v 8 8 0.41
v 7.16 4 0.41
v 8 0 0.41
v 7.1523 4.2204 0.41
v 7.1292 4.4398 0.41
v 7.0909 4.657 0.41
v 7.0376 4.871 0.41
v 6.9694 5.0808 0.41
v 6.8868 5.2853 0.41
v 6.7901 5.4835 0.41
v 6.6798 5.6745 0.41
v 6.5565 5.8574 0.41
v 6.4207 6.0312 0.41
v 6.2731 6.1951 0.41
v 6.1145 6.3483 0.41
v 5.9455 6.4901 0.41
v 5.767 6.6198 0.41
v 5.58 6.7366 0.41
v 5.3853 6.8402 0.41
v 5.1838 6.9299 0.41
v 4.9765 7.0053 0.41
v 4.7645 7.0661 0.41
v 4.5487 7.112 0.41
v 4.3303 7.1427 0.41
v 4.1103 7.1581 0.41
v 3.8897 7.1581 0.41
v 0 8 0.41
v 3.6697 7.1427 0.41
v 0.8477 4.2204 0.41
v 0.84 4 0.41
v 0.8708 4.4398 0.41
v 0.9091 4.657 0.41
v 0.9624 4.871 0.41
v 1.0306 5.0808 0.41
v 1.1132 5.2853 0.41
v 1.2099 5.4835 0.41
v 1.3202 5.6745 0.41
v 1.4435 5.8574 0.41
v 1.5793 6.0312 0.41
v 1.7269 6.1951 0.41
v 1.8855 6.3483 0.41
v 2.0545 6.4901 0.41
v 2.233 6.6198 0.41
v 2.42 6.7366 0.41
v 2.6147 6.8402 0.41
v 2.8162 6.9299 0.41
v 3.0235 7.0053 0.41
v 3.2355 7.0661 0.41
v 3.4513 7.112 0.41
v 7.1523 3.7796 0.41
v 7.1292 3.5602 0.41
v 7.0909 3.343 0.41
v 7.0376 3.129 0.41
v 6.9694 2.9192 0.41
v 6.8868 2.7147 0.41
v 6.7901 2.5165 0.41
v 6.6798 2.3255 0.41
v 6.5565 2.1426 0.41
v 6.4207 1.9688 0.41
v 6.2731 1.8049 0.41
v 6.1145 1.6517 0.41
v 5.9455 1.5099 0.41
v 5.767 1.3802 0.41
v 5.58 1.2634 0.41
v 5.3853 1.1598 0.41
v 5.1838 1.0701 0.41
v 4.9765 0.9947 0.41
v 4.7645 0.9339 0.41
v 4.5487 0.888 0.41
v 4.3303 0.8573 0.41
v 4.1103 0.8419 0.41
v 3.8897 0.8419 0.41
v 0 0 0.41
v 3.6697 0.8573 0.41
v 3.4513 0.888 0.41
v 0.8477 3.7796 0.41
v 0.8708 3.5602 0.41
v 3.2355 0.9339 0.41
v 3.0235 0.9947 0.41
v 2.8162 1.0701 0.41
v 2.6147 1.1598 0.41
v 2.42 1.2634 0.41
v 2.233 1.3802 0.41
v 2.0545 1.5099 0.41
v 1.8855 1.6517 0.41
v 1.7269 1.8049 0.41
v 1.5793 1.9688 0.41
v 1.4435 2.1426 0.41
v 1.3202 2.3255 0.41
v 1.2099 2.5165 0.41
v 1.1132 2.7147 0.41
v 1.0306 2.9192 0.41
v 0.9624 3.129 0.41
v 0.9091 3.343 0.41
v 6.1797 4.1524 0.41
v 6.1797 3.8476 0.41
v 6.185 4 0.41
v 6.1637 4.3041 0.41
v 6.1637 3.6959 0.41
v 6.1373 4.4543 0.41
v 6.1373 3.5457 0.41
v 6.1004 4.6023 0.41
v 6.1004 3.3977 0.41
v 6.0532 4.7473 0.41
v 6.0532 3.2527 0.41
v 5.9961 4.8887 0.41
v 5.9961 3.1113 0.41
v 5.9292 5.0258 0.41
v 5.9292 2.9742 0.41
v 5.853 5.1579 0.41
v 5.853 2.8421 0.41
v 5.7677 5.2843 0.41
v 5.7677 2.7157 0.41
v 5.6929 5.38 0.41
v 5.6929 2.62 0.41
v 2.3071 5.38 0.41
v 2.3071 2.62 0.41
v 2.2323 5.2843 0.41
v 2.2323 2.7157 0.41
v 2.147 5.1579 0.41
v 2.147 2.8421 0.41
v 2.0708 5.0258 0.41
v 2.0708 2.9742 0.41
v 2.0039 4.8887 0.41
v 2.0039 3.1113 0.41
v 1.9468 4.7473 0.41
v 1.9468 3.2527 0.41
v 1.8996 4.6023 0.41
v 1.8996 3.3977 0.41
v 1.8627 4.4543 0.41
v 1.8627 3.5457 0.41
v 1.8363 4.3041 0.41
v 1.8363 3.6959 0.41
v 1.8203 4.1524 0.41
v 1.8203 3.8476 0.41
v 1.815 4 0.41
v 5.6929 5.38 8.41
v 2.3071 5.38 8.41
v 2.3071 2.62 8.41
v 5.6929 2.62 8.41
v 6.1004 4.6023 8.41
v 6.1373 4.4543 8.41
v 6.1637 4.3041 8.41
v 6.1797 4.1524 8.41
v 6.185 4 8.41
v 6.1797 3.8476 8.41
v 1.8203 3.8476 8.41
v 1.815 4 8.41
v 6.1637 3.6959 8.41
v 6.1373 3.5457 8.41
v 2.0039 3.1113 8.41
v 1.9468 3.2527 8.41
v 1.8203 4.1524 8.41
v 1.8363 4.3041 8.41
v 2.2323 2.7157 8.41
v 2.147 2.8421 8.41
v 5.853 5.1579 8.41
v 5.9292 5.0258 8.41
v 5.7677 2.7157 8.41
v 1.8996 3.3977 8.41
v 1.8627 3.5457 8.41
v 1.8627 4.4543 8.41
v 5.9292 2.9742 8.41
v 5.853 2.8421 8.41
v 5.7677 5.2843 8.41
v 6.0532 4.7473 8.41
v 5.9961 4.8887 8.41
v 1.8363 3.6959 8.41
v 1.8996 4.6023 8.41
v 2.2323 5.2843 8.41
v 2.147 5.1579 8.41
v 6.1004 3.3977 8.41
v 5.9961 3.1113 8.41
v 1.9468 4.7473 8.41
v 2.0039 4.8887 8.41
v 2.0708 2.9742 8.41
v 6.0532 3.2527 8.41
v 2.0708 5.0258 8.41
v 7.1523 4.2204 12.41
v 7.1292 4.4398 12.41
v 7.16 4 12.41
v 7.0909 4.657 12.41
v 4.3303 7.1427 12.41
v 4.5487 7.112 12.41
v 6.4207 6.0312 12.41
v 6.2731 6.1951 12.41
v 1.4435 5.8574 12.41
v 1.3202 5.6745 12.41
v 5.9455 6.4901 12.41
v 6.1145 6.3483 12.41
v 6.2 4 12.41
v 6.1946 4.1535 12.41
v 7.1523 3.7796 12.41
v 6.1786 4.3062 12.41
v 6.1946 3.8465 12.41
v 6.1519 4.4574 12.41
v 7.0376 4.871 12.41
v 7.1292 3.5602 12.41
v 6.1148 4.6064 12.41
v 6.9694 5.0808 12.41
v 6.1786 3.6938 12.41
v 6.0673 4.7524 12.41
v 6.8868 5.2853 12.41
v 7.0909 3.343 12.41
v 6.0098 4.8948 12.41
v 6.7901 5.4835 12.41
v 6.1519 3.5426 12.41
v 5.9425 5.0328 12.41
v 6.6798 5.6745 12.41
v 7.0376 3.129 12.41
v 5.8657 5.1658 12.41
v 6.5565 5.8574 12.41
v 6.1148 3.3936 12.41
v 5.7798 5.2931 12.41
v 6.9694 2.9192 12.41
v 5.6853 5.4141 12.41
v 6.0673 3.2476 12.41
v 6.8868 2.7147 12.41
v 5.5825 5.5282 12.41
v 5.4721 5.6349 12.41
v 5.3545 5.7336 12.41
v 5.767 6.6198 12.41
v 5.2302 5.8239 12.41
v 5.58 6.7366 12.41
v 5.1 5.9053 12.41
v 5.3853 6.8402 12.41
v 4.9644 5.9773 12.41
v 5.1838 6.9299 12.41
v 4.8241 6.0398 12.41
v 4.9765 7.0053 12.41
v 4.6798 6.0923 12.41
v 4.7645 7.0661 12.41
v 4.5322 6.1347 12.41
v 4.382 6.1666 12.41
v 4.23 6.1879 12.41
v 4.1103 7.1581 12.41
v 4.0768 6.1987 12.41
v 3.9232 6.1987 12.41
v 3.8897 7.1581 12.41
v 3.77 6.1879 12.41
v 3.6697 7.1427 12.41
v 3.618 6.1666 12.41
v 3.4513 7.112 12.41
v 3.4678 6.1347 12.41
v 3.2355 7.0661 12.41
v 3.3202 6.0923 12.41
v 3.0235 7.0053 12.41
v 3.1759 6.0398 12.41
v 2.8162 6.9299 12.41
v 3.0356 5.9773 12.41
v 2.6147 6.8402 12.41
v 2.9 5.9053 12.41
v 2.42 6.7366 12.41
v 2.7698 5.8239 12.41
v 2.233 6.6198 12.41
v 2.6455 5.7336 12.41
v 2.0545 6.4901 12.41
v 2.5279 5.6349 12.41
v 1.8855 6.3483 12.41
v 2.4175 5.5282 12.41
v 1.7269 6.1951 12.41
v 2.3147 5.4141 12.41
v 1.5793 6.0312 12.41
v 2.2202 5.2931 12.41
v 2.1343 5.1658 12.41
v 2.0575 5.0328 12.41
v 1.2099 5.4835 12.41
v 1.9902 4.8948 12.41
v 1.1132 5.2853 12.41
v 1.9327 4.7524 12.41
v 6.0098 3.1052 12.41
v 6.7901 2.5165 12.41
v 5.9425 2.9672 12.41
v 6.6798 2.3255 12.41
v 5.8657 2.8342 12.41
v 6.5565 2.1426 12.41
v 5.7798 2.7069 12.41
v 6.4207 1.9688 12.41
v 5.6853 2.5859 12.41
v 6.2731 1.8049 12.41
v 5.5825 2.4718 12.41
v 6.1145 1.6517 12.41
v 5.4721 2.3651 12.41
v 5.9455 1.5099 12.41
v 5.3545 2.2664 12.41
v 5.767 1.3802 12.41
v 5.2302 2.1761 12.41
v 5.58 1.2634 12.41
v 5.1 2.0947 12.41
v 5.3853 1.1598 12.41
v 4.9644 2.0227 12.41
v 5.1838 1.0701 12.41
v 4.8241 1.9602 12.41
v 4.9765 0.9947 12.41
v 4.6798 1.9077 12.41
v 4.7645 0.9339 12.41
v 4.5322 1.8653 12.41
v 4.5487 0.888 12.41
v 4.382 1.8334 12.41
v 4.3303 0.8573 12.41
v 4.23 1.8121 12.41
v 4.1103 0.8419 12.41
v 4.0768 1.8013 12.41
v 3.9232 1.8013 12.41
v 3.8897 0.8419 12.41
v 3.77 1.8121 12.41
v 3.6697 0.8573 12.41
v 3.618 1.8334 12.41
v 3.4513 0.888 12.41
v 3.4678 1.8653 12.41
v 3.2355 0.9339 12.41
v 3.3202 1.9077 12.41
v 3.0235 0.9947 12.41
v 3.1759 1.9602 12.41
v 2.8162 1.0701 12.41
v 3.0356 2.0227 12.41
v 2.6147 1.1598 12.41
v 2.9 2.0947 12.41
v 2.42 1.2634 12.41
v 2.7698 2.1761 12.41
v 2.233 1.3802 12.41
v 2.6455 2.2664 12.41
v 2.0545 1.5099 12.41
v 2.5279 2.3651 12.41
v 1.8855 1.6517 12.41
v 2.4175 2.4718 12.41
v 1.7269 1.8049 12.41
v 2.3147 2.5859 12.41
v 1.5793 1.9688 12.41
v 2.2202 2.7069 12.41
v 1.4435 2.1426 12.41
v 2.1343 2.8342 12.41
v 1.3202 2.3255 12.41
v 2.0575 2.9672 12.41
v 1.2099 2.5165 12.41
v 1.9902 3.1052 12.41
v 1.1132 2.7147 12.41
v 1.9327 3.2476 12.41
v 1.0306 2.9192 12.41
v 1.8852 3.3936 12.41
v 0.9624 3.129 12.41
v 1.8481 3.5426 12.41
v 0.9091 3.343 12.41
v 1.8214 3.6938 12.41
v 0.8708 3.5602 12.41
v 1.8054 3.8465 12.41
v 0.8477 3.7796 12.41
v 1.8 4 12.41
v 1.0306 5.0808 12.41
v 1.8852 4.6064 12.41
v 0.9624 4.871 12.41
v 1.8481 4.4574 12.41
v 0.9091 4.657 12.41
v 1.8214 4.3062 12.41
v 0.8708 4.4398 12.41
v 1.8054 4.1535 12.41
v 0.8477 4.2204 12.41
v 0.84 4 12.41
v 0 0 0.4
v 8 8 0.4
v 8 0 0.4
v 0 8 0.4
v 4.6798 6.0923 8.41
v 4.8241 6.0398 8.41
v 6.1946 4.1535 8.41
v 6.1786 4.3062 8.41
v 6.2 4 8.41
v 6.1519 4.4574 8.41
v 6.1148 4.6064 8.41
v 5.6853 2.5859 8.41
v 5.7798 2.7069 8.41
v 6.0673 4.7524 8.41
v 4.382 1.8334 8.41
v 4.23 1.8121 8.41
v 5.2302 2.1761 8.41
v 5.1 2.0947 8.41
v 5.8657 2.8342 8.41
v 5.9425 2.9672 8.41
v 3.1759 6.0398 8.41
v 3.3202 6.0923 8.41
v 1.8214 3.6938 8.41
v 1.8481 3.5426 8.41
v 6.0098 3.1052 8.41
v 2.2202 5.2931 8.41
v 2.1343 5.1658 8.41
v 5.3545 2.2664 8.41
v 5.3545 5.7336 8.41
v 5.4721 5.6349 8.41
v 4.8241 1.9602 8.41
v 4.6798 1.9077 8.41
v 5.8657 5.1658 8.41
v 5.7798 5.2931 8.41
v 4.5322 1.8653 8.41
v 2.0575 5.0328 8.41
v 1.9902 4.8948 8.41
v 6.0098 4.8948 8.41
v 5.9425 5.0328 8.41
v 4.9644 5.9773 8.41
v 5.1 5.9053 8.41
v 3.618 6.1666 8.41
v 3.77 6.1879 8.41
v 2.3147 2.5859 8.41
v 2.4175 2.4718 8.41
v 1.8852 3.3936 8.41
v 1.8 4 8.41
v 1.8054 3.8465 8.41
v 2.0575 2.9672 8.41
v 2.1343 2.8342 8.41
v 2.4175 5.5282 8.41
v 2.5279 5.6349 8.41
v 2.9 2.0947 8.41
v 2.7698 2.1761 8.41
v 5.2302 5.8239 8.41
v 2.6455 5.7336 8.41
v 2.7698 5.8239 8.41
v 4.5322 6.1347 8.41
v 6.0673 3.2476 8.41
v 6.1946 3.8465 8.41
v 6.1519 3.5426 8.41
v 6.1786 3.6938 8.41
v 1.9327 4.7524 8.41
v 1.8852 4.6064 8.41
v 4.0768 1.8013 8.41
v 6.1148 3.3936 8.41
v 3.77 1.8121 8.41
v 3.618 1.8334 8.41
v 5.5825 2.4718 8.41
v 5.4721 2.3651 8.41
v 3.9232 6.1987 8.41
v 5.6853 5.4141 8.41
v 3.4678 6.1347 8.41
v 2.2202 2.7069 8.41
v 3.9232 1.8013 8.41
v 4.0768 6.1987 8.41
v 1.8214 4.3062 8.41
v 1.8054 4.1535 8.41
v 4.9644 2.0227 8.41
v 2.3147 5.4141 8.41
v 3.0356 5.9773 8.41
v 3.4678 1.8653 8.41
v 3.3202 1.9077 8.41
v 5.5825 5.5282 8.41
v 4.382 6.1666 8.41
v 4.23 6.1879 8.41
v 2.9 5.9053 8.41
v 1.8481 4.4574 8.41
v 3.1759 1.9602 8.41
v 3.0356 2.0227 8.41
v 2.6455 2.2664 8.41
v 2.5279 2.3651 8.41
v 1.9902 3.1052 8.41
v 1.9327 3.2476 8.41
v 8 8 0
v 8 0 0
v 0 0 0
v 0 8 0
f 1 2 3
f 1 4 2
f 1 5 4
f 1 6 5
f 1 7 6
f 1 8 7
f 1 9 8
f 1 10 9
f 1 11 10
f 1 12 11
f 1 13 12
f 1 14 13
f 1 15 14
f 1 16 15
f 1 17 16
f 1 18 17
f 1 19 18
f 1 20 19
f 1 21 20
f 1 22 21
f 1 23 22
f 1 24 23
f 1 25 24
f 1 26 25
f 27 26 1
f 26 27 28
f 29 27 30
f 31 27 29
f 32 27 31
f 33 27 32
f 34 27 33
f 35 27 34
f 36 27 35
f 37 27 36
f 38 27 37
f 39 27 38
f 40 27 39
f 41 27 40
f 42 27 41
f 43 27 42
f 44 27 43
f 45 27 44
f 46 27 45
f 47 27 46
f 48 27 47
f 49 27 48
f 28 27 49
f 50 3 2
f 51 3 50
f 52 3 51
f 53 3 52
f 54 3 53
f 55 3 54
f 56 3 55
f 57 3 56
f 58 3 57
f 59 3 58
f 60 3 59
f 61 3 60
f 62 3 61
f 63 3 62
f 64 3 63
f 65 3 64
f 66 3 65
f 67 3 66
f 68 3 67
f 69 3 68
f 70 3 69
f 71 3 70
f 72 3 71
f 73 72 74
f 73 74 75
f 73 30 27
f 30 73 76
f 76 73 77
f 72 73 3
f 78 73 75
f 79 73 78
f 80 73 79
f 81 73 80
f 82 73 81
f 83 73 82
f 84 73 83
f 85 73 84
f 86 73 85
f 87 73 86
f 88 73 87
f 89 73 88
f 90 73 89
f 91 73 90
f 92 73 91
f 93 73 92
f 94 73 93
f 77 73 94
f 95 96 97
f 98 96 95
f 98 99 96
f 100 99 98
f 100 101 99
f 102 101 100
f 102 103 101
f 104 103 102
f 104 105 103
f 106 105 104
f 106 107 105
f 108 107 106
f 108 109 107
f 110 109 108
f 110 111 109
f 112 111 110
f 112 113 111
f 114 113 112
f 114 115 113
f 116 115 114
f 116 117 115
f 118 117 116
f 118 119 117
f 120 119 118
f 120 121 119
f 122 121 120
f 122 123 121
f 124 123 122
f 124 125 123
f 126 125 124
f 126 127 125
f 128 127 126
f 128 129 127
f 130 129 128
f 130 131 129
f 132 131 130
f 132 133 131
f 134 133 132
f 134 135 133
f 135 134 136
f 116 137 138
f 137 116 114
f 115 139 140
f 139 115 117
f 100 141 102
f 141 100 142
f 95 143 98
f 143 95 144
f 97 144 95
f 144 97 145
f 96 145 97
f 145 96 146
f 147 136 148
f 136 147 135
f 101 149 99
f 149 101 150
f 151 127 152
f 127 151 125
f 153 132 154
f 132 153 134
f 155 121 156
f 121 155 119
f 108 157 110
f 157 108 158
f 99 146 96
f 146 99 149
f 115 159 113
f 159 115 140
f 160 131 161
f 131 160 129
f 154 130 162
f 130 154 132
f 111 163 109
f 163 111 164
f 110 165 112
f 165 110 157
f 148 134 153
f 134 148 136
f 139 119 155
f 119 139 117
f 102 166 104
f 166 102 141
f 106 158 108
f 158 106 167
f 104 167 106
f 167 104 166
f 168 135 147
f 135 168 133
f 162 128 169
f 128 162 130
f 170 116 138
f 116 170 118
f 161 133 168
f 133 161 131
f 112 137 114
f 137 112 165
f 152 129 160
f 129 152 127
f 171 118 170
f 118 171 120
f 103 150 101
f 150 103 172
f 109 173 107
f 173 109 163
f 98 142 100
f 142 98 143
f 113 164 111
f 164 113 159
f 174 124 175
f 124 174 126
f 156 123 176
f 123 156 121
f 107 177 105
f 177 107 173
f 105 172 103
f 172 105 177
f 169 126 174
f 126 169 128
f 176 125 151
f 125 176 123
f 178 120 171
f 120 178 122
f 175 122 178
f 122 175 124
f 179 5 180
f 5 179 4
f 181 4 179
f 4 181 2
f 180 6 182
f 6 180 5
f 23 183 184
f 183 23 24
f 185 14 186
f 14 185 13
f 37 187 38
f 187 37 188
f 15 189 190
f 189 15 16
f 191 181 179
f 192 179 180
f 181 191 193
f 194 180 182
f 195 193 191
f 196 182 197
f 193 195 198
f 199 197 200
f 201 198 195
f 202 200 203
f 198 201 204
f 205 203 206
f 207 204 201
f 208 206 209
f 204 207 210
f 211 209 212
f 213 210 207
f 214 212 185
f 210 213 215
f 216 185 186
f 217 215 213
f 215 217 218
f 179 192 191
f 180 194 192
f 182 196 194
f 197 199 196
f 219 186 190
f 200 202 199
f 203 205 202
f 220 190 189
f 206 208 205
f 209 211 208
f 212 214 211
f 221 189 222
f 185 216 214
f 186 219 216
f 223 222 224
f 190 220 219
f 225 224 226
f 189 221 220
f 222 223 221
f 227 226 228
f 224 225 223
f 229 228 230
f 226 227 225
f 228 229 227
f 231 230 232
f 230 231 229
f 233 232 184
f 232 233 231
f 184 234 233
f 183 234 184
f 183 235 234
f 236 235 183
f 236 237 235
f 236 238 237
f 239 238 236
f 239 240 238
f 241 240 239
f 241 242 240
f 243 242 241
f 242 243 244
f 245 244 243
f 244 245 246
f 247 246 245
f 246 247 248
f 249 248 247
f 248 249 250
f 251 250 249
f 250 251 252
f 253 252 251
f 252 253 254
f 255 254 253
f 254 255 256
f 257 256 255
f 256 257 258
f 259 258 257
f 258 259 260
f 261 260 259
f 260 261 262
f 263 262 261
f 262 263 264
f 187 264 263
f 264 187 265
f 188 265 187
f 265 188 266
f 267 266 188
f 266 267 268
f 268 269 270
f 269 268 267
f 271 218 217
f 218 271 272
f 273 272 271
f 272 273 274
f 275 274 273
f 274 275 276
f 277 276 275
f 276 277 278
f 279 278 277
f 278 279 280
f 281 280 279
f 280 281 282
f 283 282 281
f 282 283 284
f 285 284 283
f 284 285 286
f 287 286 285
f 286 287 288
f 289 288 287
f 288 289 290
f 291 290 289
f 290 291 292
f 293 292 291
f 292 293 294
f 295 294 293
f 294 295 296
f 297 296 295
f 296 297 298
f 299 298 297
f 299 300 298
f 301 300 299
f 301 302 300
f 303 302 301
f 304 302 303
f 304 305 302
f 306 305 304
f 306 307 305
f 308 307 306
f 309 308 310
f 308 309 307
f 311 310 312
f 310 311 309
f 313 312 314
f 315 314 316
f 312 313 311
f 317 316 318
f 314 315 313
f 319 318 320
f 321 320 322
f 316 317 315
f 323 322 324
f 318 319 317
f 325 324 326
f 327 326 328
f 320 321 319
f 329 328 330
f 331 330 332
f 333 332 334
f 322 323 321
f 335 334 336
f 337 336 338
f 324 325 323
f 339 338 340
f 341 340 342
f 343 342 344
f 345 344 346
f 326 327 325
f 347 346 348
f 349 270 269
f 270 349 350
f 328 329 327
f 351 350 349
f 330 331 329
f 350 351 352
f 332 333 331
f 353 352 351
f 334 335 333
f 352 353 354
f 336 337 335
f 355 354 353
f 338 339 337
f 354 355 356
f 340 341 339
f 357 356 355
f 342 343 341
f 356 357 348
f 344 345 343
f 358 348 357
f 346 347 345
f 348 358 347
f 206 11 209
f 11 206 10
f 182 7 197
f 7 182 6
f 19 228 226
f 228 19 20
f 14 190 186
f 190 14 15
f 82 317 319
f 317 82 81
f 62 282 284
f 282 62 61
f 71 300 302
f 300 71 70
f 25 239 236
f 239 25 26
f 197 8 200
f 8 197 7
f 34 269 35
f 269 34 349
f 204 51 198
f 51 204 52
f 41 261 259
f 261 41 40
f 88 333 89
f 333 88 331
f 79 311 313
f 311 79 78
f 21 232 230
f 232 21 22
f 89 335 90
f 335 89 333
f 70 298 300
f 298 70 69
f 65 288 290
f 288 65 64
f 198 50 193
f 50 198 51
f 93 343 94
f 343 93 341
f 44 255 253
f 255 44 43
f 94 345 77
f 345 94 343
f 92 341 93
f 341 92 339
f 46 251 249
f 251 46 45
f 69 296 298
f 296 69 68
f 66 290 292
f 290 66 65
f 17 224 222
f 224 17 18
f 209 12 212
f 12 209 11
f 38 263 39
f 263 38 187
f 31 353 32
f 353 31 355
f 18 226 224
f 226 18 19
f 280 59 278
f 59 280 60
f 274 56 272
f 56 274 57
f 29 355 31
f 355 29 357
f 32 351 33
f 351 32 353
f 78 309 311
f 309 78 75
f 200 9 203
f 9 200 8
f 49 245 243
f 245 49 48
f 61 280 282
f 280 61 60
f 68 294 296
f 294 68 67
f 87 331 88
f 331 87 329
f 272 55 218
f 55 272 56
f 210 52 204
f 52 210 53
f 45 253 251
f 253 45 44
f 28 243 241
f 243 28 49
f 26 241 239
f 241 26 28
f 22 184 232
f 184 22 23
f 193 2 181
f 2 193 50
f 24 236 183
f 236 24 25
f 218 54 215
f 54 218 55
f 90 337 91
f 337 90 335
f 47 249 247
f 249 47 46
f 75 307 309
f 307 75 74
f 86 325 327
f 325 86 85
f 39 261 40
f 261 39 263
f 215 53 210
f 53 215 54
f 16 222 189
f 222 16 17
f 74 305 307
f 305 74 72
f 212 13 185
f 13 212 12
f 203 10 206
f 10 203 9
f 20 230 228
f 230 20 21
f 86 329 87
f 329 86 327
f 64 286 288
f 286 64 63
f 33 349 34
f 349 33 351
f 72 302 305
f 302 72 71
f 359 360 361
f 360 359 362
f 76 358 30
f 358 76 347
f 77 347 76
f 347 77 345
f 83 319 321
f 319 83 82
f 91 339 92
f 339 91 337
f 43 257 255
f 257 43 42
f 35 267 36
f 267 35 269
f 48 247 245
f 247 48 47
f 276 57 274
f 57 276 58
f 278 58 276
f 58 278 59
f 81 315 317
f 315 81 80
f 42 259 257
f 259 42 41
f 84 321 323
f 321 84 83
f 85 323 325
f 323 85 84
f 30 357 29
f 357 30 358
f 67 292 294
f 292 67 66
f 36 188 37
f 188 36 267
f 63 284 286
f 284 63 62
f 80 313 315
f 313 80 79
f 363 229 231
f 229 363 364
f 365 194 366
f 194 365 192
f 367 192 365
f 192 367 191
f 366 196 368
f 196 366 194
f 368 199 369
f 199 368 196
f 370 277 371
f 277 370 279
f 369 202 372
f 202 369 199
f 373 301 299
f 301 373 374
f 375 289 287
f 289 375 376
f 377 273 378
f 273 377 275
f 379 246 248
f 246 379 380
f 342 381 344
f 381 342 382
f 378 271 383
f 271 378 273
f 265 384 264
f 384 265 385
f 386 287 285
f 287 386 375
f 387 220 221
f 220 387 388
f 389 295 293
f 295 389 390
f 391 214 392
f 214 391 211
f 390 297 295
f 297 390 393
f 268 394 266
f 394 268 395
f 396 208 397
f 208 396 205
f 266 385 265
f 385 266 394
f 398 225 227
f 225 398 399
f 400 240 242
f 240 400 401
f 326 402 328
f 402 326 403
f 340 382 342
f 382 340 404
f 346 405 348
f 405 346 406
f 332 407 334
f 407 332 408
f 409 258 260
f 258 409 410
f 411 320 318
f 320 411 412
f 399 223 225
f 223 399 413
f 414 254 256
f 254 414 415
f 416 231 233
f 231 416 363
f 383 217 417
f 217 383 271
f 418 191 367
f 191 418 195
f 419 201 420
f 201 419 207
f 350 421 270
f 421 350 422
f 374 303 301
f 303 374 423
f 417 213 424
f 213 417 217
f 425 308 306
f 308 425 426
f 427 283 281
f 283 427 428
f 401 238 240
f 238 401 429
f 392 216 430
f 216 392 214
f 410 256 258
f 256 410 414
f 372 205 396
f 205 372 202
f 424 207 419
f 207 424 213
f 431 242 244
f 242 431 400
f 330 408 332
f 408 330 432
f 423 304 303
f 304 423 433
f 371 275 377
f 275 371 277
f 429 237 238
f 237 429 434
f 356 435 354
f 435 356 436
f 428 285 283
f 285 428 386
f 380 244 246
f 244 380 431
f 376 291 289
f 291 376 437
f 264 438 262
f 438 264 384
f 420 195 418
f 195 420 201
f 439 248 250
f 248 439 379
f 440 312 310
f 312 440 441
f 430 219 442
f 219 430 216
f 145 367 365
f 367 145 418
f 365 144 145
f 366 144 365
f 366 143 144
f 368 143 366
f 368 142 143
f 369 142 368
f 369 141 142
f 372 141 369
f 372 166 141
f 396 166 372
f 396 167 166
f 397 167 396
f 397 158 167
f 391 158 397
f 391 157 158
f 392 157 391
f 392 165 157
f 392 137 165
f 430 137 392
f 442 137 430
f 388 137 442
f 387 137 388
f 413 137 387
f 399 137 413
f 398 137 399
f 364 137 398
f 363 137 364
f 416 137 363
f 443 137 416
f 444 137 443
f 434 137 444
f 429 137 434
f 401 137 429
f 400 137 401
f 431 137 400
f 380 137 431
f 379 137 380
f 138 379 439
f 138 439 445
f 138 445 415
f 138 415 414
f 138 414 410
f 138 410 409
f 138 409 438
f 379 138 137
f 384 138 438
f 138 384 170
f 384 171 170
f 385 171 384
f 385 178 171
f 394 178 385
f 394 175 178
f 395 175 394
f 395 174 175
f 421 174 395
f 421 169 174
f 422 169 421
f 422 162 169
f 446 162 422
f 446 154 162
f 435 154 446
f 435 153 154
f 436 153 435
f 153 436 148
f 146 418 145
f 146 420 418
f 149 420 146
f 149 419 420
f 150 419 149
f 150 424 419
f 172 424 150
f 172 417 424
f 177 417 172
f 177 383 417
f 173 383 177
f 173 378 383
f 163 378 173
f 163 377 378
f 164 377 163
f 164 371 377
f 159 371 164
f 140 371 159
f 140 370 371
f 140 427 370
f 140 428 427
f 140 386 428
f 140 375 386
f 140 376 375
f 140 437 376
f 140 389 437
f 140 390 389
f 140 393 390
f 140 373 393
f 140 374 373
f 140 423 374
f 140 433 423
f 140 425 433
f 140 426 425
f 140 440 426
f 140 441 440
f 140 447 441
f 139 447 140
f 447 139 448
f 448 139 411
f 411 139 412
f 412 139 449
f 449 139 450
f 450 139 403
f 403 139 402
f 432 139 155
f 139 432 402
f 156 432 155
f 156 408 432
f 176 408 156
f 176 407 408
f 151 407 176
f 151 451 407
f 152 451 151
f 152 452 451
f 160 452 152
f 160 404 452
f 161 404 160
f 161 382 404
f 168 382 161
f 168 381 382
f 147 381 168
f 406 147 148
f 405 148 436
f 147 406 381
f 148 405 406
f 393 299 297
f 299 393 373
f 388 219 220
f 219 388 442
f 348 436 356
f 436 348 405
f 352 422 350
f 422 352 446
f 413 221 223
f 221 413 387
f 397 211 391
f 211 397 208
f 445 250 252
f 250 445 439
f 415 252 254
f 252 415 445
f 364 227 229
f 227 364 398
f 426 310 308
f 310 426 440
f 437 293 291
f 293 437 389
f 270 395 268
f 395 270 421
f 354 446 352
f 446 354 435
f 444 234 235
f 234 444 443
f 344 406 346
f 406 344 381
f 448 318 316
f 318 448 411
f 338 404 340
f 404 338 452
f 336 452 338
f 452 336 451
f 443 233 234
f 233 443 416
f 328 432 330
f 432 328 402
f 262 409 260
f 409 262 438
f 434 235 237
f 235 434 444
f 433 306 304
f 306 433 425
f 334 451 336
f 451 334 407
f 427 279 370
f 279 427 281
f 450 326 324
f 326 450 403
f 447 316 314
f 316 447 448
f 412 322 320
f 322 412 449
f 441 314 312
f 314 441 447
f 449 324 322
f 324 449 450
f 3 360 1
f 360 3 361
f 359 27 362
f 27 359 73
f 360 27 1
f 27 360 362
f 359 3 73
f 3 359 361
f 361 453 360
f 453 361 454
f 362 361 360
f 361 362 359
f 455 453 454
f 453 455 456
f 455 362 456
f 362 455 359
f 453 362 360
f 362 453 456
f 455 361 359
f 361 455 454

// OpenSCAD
// file: ../../Base/PlacementOptions.scad
// Fischertechnik Box Foundation
// Placement Options

// Alignment
NoAlign = 0;
AlignLeft = 1;
AlignBottom = 2;
AlignCenter = 3;
AlignRight = 4;
AlignTop = 5;

// Element rotation degree steps
rotations = [0, -90, -180, -270];

// Rotation
NoRotation = 0;
Rotate0 = 0;
Rotate90 = 1;
Rotate180 = 2;
Rotate270 = 3;

// Docking (seen from above)
NoDock = -1;
DockLeft = 0;
DockTop = 1;
DockRight = 2;
DockCorner = 2;
DockBottom = 3;

// Web corners
LowerLeft = 0;
UpperLeft = 1;
UpperRight = 2;
LowerRight = 3;

// Web position relative to corner
LeftOfCorner = 0;
RightOfCorner = 1;

// Rails direction
Horizontal = true;
Vertical = false;
// file: ../../Base/Boxes.scad
// Fischertechnik Box Foundation
// Pre-designed Boxes

use <Constants.scad>

include <PlacementOptions.scad>

box190Width = 190;
box190Depth = 130;
box130Width = 130;
box130Depth = 95;

// Values are from an original ec3 box
topBottomDifference = 1.5;
outerHeight = 40;
baseThickness = 1.8;
innerHeight = outerHeight - baseThickness;
stackExcess = 5.7;
radius = 3.5;
wallThickness = 1.5;
tolerance = 0.2;

boxWallThickness = wallThickness;
boxBaseThickness = baseThickness;
boxWebWidth = 3.0;

// getBoxWallThickness()
// Gets the wall thickness of a Fischertechnik Box
function getBoxWallThickness() = boxWallThickness;

// getBoxUsageHeight(height = 38.2)
// Gets the usable height of a Fischertechnik box
// height = Outer height of the box from the bottom to the upper edge.
function getBoxUsageHeight(height = outerHeight) = height - baseThickness - stackExcess;

// getBoxInnerHeight()
// Gets the inner height of a Fischertechnik box, including the stack excess
function getBoxInnerHeight() = innerHeight;

// getBoxBaseThickness()
// Gets the thickness of the Fischertechnik box base.
function getBoxBaseThickness() = boxBaseThickness;

// getBoxWebWidth()
// Gets the width of a box web
function getBoxWebWidth() = boxWebWidth;

// getBox190Space()
// Gets the usable inner space of a Box 190 as an x/y-list
function getBox190Space() = [
    box190Width - 2*getBoxWallThickness() - topBottomDifference, 
    box190Depth - 2*getBoxWallThickness() - topBottomDifference ];

// RoundedCornerPlate(width, depth, height, radius)
// Creates a body plate with rounded corners for a box. Used
// also to create the complete box with the hull module.
// width = Width of the plate
// depth = depth of the plate 
// height = thickness of the plate
// radius = radius of the rounded corner
module RoundedCornerPlate(width, depth, height, radius) {
    translate([radius, radius])
    hull() {
        w = width-2*radius;
        d = depth-2*radius;
        cube([w, d, height]);
        cylinder(height, r=radius, $fn=getFragments());
        translate([w, 0])
            cylinder(height, r=radius, $fn=getFragments());
        translate([w, d])
            cylinder(height, r=radius, $fn=getFragments());
        translate([0, d])
            cylinder(height, r=radius, $fn=getFragments());
    }
}

// BoxBase(width, depth)
// Creates an empty stackable Fischertechnik compatible box
// width = Outer width of the box (190, 130, ...)
// depth = Outer depth of the box (130, 95, ...)

module BoxBase(width, depth, height=outerHeight) {    
    thinPlate = 0.01;

    innerHeight = height - baseThickness;    
    
    module Body(tolerance=tolerance) {
        hull() {
            // Bottom with tolerance to fit into the original boxes when stacked
            translate([-wallThickness+tolerance, -wallThickness+tolerance, -baseThickness])
                RoundedCornerPlate(width-topBottomDifference-2*tolerance, depth-topBottomDifference-2*tolerance, thinPlate, radius);
            
            // Top
            translate([-wallThickness-topBottomDifference/2, -wallThickness-topBottomDifference/2, innerHeight-thinPlate])
                RoundedCornerPlate(width, depth, thinPlate, radius);
         }
    }

    module Cutoff() {
        hull() {
            coWidth = width - 2*wallThickness;
            coDepth = depth - 2*wallThickness;
            
            // Bottom
            RoundedCornerPlate(coWidth-topBottomDifference, coDepth-topBottomDifference, thinPlate, radius);

            // Top
            translate([-topBottomDifference/2, -topBottomDifference/2, innerHeight+thinPlate]) 
                RoundedCornerPlate(coWidth, coDepth, thinPlate, radius);
        }
    }
    
    difference() {        
        Body();
        Cutoff();
        stackOffset = innerHeight - stackExcess;
        translate([0, 0, stackOffset + baseThickness])
            Body(tolerance=0);
    }
}

// Creates the Fischertechnik empty box 130x190 mm and places it at position 0,0
// 190x130 are the outer sizes, the inner space is slightly smaller. Use getBox190Space() to get the inner sizes.
// The box is positioned that the usable inner space is at the 0,0,0 position.

module Box190() {
    BoxBase(box190Width, box190Depth);
}

// Gets the usable inner space of a Box 130 as an x/y-list
function getBox130Space() = [
    box130Width - 2*getBoxWallThickness() - topBottomDifference, 
    box130Depth - 2*getBoxWallThickness() - topBottomDifference ];

// Creates the Fischertechnik empty box 95x130 mm and places it at position 0,0
// 190x130 are the outer sizes, the inner space is slightly smaller. Use getBox190Space() to get the inner sizes.
// The box is positioned that the usable inner space is at the 0,0,0 position.

module Box130() {
    BoxBase(box130Width, box130Depth);
}

// Creates a web at the specified box walls
// corner 0 = LowerLeft, 1 = UpperLeft, 2 = UpperRight, 3 = LowerRight
// side 0 = LeftOfCorner, 1 = RightOfCorner
// distance = Distance in mm from the corner
// boxSpace = inner width and depth of the box (default: Box 190)
// webWidth = length of the web (default is 3 mms)
// webThickness = thickness of the web (default is 1 mm)
// height = Height of the web (standard is getBoxUsageHeight())
// sink = How much of the web is sunk into the wall

module BoxWeb(
    corner, 
    side, 
    distance, 
    boxSpace=getBox190Space(), 
    webWidth=getBoxWebWidth(), 
    webThickness=1.0, 
    height=getBoxUsageHeight(),
    sink = getBoxWallThickness()/2) {
    width = (corner % 2 == 0) ? 
            (side == LeftOfCorner ? webWidth : webThickness) :
            (side == LeftOfCorner ? webThickness : webWidth);

    depth = (corner % 2 == 0) ? 
            (side == RightOfCorner ? webWidth : webThickness) :
            (side == RightOfCorner ? webThickness : webWidth);
    
    xDiff = corner == LowerLeft ? 
                (side == LeftOfCorner ? -sink : distance) :
            (corner == UpperLeft ?                
                (side == LeftOfCorner ? distance : -sink) :
            (corner == UpperRight ?
                (side == LeftOfCorner ? boxSpace.x-webWidth+sink : boxSpace.x-distance-webThickness) :
                (side == LeftOfCorner ? boxSpace.x-distance-webThickness: boxSpace.x-webWidth+sink)));

    yDiff = corner == LowerLeft ? 
                (side == RightOfCorner ? -sink : distance) :
            (corner == UpperLeft ?
                (side == RightOfCorner ? boxSpace.y-distance-webThickness : boxSpace.y-webWidth+sink) :
            (corner == UpperRight ?
                (side == RightOfCorner ? boxSpace.y-webWidth+sink : boxSpace.y-distance-webThickness) :
                (side == RightOfCorner ? distance : -sink)));
    
    translate([xDiff, yDiff, -getExcess()])
        cube([width, depth, height + 2*getExcess()]);
}
// file: ../../Base/Rotation.scad
// Fischertechnik Box Foundation
// Geometry Helpers Rotation

include <PlacementOptions.scad>

// getRotatedSpace(space, rotation=NoRotation)
// Rotates the space dependent on the specified rotation

function getRotatedSpace(space, rotation=NoRotation) = [
    (rotation == Rotate90 || rotation == Rotate270) ? space.y : space.x,
    (rotation == Rotate90 || rotation == Rotate270) ? space.x : space.y
];

// Rotates the given space around the fixed left lower corner
// space = the space the children needs as width/depth list [width,depth]
// rotation = 0 Rotate0 degrees, 1 Rotate90 degrees, 2 Rotate180 degrees, 3 Rotate270 degrees (equivalent to -90)

module RotateFix(space, rotation=NoRotation) {
    dy = (rotation == Rotate0 || rotation == Rotate270) ? 0 :
        (rotation == Rotate90) ? space.x :
        space.y;
    dx = (rotation < Rotate180) ? 0 :
        (rotation == Rotate180) ? space.x :
        space.y;
    
    translate([dx, dy, 0])
        rotate([0, 0, rotations[rotation]])
            children();
}
// file: ../../Base/Alignment.scad
// Fischertechnik Box Foundation
// Geometry Helpers Alignment

include <PlacementOptions.scad>

// getAlignedX(elementWidth, spaceWidth, align=AlignRight, offset=0)
// Gets the aligned X offset of an element with the given
// width in the given space.
// elementWidth = The width of the element to positon
// spaceWidth = The space where the element should be aligned
// align = 0 AlignLeft, 1 AlignCenter, 2 AlignRight
// offset = an optional offset from the aligned position. When
// aligned left or centered, then positive values are in X direction.
// When aligned right then positive values are in negative X direction.

function getAlignedX(elementWidth, spaceWidth, align=AlignRight, offset=0) =
    (align == AlignLeft) ?
        offset :
        ((align == AlignCenter) ?
        (spaceWidth - elementWidth)/2 + offset :
        spaceWidth - offset - elementWidth);

// getAlignedY(elementDepth, spaceDepth, align=AlignTop, offset=0)
// Gets the aligned Y offset of an element with the given
// depth in the given space.
// elementDepth = The depth of the element to positon
// spaceDepth = The space where the element should be aligned
// align = 0 AlignBottom, 1 AlignCenter, 2 AlignTop
// offset = an optional offset from the aligned position. When
// aligned bottom or centered, then positive values are in Y direction.
// When aligned top then positive values are in negative Y direction.

function getAlignedY(elementDepth, spaceDepth, align=AlignTop, offset=0) =
    (align == AlignBottom) ?
        offset :
        ((align == AlignCenter) ?
        (spaceDepth - elementDepth)/2 + offset :
        spaceDepth - offset - elementDepth);
// file: ../../Base/Placement.scad
// Fischertechnik Box Foundation
// Geometry Helpers Placement

use <Constants.scad>
use <Alignment.scad>
use <Rotation.scad>
use <Boxes.scad>

include <PlacementOptions.scad>

// Place(x=0, y=0, elementSpace=[0,0], alignX=AlignLeft, alignY=AlignBottom, rotation=Rotate0, boxSpace=getBox190Space())
// Places the child at the specified position
// y = Y-Position. This is a relative position when an X aligment is specified.
// x = X-Position. This is a relative position when an Y aligment is specified.
// elementSpace = space of the element to be placed [x,y]
// alignX = -1=NoAlign, 0 AlignLeft, 1 AlignCenter, 3 AlignRight (elementSpace and boxSpace required!)
// alignY = -1=NoAlign, 2 AlignBottom, 1 AlignCenter, 4 AlignTop (elementSpace and boxSpace required!)
// rotation = 0 Rotate0 0 degrees, 1 Rotate90 90 degrees, 
// 2 Rotate180 180 degrees, 3 Rotate270 270 degrees (equivalent to -90)
// boxSpace = Inner space of the box where the placement occurs [x,y] - default is Box 190x130 inner space

module Place(x=0, y=0, elementSpace=[0,0], 
  alignX=AlignLeft, alignY=AlignBottom, 
  rotation=NoRotation, boxSpace=getBox190Space()) {

    module Position(x, y, space, rotation=Rotate0) {
        translate([x, y, 0])
            RotateFix(space, rotation)
                children();
    }

    space = getRotatedSpace(elementSpace, rotation);
    alignedX = getAlignedX(space.x, boxSpace.x, alignX, x);
    alignedY = getAlignedY(space.y, boxSpace.y, alignY, y);
    Position(alignedX, alignedY, elementSpace, rotation)
        children();
}

// Center(space=getBox130Space(), elementSpace=[0,0])
// space = Space where the children is centered. For cylinder use centered=true and no elementSpace.
// elementSpace = space of the element to be centered [x,y]

module Center(space=getBox190Space(), elementSpace=[0,0]) {
    Place(elementSpace=elementSpace, boxSpace=space, alignX=AlignCenter, alignY=AlignCenter)
        children();
}

// CenterHorizontal(width=0, y=0, offset=0, space=getBox130Space())
// width = Width of the element to be placed.
// y = Y position of the element
// offset = Offset from the center position (negative will be left of the center)
// space = Space where the element is placed

module CenterHorizontal(width=0, y=0, offset=0, space=getBox190Space()) {
    Place(x=offset, y=y, elementSpace=[width, 0], boxSpace=space, alignX=AlignCenter)
        children(0);
}

// CenterVertical(depth=0, x=0, offset=0, space=getBox130Space())
// depth = Depth of the element to be placed.
// x = X position of the element
// offset = Offset from the center position (negative will be down of the center)
// space = Space where the element is placed

module CenterVertical(depth=0, x=0, offset=0, space=getBox190Space()) {
    Place(x=x, y=offset, elementSpace=[0, depth], boxSpace=space, alignY=AlignCenter)
        children(0);
}

// getIsVertical(align)
// True if the specified alignment needs a vertical orientation for a divider (AlignRight, AlignLeft)

function getIsVertical(align) = (align == AlignRight || align == AlignLeft);

// getIsHorizontal(align)
// True if the specified alignment needs a horizontal orientation for a divider (AlignTop, AlignBottom)

function getIsHorizontal(align) = (align == AlignTop || align == AlignBottom);
// file: ../../Elements/AxisClip10.scad
// Fischertechnik Box Library
// Axis for clip 10
// 31023

use <../ModelBase/Simple.scad>
use <../Base/Constants.scad>

/* [Element Parameters] */
height = 23;
clipHeight = 10;

/* [Hidden] */
width = 12;
depth = 12;
upperDiameter = 3.6;

// getAxisClip10Space()
// Gets the space of a n axis for a clip 10 with spring ring (mot2)

function getAxisClip10Space() = [width, depth, height];

// AxisClip10(height, clipHeight)
// Axis for clip 10 with spring ring (mot2)
// height = Height of the complete axis (standard is 23, in mot3 its only 12)
// clipHeight = Height of the part for the clip (standard is 10, in mot3 its only 7)

module AxisClip10(height=height, clipHeight=clipHeight) {
    LeveledAxisWithSpace(height, height-clipHeight, getAxisClip10Space(), diameter=upperDiameter);
}

// Test
color("lightgray")
AxisClip10(height, clipHeight);
// file: ../../Base/Constants.scad
// Fischertechnik Box Foundation
// Constants

// Constant values necessary for multiple elements

// Base constants
dividerThickness = 1.2;
excess = 0.01;
fragments = 90;
tolerance = 0.8;

// Gets the thickness of a divider 
function getDividerThickness() = dividerThickness;

// Gets the excess that is used to merge walls into each other
function getExcess() = excess;

// Gets amount of fragments of a cylinder
function getFragments() = fragments;

// Gets the inner tolerance of a frame to each side
function getTolerance() = tolerance;


// Fischertechnik specific constants
axisDiameter = 4;
axisBottomDiameter = axisDiameter + 1;
axisTolerance = 0.2;
axisLockingLength = 8;

// Gets axis diameter of Fischertechnik axis
function getAxisDiameter() = axisDiameter;

// Gets axis diameter tolerance (subtracted for element axis)
function getAxisTolerance() = axisTolerance;

// Gets the axis diameter for standing axis
function getStandAxisDiameter() = getAxisDiameter() - getAxisTolerance();

// Gets axis bottom diameter for thicker part at the bottom
function getAxisBottomDiameter() = axisBottomDiameter;

// Gets the lengthh of the locking part of a locking axis
function getAxisLockingLength() = axisLockingLength;

// Studs

studHeight = 2.5;
studTolerance = 0.2;
studRailDistance = 9;   // as in ft 50

// gets the height of a connecting stud
function getStudHeight() = studHeight;

// gets the connecting stud height tolerance
function getStudTolerance() = studTolerance;

// gets the default rail distance for studs
function getStudRailDistance() = studRailDistance;

// Dockable Frame with Edge

standardEdgeDistance = 2.5;
standardWebDistance = 11.5;
standardCornerLength = 15;

// gets the standard distance to the wall of the box for dockable frames with webs
function getStandardEdgeDistance() = standardEdgeDistance;

// gets the standard distance of each web to the corner of the dockable frame
function getStandardWebDistance() = standardWebDistance;

// gets the standard length of the corner walls of a dockable frame
function getStandardCornerLength() = standardCornerLength;

// Tubes

tubeWallFactor = 0.8;

// gets the wall thickness of a tube.
function getTubeWallThickness() = tubeWallFactor * getDividerThickness();

// Small Parts and Divider Frame

smallPartsFrameHeight = 20;

// gets the frame height for docked small parts boxes.
function getSmallPartsFrameHeight() = smallPartsFrameHeight;

// Hubs

hubRingDiameter = 19.5;
hubRingLevelDiameter = 21;

// gets the diameter of a tube matching the inner ring of a wheel
function getHubRingDiameter() = hubRingDiameter;

// gets the diameter of a hub tube with a thicker diameter
function getHubRingLevelDiameter() = hubRingLevelDiameter;

// Struts

strutAddLength = 9.0;
strutDepth = 8.0;

// gets the full length of a strut
function getFullStrutLength(length) = length + strutAddLength;

// gets the radius of the end of a strut
function getStrutEndRadius() = strutAddLength / 2;

// gets the the depth of a strut
function getStrutDepth() = strutDepth;

// Propeller

propellerAxisDiameter = 7.0;
propellerAxisTolerance = 0.2;

// gets the propeller axis outer diameter
function getPropellerAxisDiameter() = propellerAxisDiameter;

// gets the propeller axis printing tolerance
function getPropellerAxisTolerance() = propellerAxisTolerance;
// file: ../../Elements/CylinderLockingAxis30.scad
// Fischertechnik Box Library
// Cylinder for standing locking axis 30
// 35063

use <../Base/Constants.scad>
use <../Base/Placement.scad>
use <../ModelBase/Simple.scad>

/* [Hidden] */
width = 8;
depth = 8;
height = 12;

// getCylinderLockingAxis30Space()
// Gets the space the cylinder for a 30 mm axis needs

function getCylinderLockingAxis30Space() = [width, depth, height];

// CylinderLockingAxis30()
// Standing cylinder for locking axis 30
// 35063

module CylinderLockingAxis30() {
    Space(getCylinderLockingAxis30Space());
    
    Center(getCylinderLockingAxis30Space())
        LockingTube(height);
}

// Tests
color("lightgray")
CylinderLockingAxis30();
// file: ../TestPrint.scad
// 3D Print Test Base

use <../Base/Constants.scad>

use <../Elements/AxisClip10.scad>

module TestPrint(elementSpace) {
    cube([elementSpace.x, elementSpace.y, 0.4]);
    translate([0,0,0.4+getExcess()]) {
        children();
    }
}

TestPrint(getAxisClip10Space())
    AxisClip10();
// main file
// 3D Print Test
// CylinderLockingAxis30

use <../TestPrint.scad>
use <../../Elements/CylinderLockingAxis30.scad>

TestPrint(getCylinderLockingAxis30Space())
    CylinderLockingAxis30();
